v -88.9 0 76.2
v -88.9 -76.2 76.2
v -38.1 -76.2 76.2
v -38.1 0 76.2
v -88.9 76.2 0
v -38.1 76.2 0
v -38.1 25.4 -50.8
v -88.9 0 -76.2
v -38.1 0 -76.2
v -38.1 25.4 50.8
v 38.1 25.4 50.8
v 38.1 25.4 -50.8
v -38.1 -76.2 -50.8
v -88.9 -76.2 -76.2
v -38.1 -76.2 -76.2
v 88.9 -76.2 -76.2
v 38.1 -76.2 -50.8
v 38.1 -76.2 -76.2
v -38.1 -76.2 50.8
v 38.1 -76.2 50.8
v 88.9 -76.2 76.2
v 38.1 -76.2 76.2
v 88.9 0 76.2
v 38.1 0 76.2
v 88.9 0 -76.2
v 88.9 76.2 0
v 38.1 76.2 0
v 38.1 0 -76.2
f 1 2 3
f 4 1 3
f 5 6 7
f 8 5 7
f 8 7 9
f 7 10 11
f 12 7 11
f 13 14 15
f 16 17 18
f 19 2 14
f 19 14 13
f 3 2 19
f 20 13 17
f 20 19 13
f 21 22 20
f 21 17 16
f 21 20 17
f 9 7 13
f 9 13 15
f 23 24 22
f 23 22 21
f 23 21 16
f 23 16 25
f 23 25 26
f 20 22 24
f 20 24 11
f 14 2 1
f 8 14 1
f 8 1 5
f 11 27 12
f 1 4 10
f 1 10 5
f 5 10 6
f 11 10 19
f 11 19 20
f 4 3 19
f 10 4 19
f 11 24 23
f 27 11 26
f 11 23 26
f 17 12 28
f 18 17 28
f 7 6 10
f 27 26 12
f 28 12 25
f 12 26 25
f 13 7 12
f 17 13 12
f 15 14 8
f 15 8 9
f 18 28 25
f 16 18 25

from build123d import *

# Parameters (mm, degrees)
SKETCH2_W           = 177.8
SKETCH2_H           = 152.4
BOSS_EXTRUDE1_DEPTH = 76.2
SKETCH10_W          = 76.2
SKETCH10_H          = 50.8
CUT_EXTRUDE2_DEPTH  = 193.18587357
SKETCH12_W          = 76.2
SKETCH12_H          = 25.4
CUT_EXTRUDE3_DEPTH  = 156.02325632
CUT_EXTRUDE4_DEPTH  = 208.907960406


with BuildPart() as part:
    # Sketch2 → Boss-Extrude1 (new, symmetric)
    with BuildSketch(Plane.XY):
        Rectangle(SKETCH2_W, SKETCH2_H)
    extrude(amount=BOSS_EXTRUDE1_DEPTH, both=True)

    # Sketch10 → Cut-Extrude2 (cut, through all)
    with BuildSketch(Plane.XY.offset(76.2)):
        with Locations((0, 50.8)):
            Rectangle(SKETCH10_W, SKETCH10_H)
    extrude(amount=-CUT_EXTRUDE2_DEPTH, mode=Mode.SUBTRACT)

    # Sketch12 → Cut-Extrude3 (cut, through all)
    with BuildSketch(Plane(origin=(0, 25.4, 0), x_dir=(1, 0, 0), z_dir=(0, 1, 0))):
        with Locations((0, -63.5)):
            Rectangle(SKETCH12_W, SKETCH12_H)
        with Locations((0, 63.5)):
            Rectangle(SKETCH12_W, SKETCH12_H)
    extrude(amount=-CUT_EXTRUDE3_DEPTH, mode=Mode.SUBTRACT)

    # Sketch13 → Cut-Extrude4 (cut, through all)
    with BuildSketch(Plane(origin=(88.9, 0, 0), x_dir=(0, 0, -1), z_dir=(1, 0, 0))):
        Polygon((76.2, 76.2), (0, 76.2), (76.2, 0), align=None)
        Polygon((-76.2, 76.2), (-76.2, 0), (0, 76.2), align=None)
    extrude(amount=-CUT_EXTRUDE4_DEPTH, mode=Mode.SUBTRACT)


solid = part.part
